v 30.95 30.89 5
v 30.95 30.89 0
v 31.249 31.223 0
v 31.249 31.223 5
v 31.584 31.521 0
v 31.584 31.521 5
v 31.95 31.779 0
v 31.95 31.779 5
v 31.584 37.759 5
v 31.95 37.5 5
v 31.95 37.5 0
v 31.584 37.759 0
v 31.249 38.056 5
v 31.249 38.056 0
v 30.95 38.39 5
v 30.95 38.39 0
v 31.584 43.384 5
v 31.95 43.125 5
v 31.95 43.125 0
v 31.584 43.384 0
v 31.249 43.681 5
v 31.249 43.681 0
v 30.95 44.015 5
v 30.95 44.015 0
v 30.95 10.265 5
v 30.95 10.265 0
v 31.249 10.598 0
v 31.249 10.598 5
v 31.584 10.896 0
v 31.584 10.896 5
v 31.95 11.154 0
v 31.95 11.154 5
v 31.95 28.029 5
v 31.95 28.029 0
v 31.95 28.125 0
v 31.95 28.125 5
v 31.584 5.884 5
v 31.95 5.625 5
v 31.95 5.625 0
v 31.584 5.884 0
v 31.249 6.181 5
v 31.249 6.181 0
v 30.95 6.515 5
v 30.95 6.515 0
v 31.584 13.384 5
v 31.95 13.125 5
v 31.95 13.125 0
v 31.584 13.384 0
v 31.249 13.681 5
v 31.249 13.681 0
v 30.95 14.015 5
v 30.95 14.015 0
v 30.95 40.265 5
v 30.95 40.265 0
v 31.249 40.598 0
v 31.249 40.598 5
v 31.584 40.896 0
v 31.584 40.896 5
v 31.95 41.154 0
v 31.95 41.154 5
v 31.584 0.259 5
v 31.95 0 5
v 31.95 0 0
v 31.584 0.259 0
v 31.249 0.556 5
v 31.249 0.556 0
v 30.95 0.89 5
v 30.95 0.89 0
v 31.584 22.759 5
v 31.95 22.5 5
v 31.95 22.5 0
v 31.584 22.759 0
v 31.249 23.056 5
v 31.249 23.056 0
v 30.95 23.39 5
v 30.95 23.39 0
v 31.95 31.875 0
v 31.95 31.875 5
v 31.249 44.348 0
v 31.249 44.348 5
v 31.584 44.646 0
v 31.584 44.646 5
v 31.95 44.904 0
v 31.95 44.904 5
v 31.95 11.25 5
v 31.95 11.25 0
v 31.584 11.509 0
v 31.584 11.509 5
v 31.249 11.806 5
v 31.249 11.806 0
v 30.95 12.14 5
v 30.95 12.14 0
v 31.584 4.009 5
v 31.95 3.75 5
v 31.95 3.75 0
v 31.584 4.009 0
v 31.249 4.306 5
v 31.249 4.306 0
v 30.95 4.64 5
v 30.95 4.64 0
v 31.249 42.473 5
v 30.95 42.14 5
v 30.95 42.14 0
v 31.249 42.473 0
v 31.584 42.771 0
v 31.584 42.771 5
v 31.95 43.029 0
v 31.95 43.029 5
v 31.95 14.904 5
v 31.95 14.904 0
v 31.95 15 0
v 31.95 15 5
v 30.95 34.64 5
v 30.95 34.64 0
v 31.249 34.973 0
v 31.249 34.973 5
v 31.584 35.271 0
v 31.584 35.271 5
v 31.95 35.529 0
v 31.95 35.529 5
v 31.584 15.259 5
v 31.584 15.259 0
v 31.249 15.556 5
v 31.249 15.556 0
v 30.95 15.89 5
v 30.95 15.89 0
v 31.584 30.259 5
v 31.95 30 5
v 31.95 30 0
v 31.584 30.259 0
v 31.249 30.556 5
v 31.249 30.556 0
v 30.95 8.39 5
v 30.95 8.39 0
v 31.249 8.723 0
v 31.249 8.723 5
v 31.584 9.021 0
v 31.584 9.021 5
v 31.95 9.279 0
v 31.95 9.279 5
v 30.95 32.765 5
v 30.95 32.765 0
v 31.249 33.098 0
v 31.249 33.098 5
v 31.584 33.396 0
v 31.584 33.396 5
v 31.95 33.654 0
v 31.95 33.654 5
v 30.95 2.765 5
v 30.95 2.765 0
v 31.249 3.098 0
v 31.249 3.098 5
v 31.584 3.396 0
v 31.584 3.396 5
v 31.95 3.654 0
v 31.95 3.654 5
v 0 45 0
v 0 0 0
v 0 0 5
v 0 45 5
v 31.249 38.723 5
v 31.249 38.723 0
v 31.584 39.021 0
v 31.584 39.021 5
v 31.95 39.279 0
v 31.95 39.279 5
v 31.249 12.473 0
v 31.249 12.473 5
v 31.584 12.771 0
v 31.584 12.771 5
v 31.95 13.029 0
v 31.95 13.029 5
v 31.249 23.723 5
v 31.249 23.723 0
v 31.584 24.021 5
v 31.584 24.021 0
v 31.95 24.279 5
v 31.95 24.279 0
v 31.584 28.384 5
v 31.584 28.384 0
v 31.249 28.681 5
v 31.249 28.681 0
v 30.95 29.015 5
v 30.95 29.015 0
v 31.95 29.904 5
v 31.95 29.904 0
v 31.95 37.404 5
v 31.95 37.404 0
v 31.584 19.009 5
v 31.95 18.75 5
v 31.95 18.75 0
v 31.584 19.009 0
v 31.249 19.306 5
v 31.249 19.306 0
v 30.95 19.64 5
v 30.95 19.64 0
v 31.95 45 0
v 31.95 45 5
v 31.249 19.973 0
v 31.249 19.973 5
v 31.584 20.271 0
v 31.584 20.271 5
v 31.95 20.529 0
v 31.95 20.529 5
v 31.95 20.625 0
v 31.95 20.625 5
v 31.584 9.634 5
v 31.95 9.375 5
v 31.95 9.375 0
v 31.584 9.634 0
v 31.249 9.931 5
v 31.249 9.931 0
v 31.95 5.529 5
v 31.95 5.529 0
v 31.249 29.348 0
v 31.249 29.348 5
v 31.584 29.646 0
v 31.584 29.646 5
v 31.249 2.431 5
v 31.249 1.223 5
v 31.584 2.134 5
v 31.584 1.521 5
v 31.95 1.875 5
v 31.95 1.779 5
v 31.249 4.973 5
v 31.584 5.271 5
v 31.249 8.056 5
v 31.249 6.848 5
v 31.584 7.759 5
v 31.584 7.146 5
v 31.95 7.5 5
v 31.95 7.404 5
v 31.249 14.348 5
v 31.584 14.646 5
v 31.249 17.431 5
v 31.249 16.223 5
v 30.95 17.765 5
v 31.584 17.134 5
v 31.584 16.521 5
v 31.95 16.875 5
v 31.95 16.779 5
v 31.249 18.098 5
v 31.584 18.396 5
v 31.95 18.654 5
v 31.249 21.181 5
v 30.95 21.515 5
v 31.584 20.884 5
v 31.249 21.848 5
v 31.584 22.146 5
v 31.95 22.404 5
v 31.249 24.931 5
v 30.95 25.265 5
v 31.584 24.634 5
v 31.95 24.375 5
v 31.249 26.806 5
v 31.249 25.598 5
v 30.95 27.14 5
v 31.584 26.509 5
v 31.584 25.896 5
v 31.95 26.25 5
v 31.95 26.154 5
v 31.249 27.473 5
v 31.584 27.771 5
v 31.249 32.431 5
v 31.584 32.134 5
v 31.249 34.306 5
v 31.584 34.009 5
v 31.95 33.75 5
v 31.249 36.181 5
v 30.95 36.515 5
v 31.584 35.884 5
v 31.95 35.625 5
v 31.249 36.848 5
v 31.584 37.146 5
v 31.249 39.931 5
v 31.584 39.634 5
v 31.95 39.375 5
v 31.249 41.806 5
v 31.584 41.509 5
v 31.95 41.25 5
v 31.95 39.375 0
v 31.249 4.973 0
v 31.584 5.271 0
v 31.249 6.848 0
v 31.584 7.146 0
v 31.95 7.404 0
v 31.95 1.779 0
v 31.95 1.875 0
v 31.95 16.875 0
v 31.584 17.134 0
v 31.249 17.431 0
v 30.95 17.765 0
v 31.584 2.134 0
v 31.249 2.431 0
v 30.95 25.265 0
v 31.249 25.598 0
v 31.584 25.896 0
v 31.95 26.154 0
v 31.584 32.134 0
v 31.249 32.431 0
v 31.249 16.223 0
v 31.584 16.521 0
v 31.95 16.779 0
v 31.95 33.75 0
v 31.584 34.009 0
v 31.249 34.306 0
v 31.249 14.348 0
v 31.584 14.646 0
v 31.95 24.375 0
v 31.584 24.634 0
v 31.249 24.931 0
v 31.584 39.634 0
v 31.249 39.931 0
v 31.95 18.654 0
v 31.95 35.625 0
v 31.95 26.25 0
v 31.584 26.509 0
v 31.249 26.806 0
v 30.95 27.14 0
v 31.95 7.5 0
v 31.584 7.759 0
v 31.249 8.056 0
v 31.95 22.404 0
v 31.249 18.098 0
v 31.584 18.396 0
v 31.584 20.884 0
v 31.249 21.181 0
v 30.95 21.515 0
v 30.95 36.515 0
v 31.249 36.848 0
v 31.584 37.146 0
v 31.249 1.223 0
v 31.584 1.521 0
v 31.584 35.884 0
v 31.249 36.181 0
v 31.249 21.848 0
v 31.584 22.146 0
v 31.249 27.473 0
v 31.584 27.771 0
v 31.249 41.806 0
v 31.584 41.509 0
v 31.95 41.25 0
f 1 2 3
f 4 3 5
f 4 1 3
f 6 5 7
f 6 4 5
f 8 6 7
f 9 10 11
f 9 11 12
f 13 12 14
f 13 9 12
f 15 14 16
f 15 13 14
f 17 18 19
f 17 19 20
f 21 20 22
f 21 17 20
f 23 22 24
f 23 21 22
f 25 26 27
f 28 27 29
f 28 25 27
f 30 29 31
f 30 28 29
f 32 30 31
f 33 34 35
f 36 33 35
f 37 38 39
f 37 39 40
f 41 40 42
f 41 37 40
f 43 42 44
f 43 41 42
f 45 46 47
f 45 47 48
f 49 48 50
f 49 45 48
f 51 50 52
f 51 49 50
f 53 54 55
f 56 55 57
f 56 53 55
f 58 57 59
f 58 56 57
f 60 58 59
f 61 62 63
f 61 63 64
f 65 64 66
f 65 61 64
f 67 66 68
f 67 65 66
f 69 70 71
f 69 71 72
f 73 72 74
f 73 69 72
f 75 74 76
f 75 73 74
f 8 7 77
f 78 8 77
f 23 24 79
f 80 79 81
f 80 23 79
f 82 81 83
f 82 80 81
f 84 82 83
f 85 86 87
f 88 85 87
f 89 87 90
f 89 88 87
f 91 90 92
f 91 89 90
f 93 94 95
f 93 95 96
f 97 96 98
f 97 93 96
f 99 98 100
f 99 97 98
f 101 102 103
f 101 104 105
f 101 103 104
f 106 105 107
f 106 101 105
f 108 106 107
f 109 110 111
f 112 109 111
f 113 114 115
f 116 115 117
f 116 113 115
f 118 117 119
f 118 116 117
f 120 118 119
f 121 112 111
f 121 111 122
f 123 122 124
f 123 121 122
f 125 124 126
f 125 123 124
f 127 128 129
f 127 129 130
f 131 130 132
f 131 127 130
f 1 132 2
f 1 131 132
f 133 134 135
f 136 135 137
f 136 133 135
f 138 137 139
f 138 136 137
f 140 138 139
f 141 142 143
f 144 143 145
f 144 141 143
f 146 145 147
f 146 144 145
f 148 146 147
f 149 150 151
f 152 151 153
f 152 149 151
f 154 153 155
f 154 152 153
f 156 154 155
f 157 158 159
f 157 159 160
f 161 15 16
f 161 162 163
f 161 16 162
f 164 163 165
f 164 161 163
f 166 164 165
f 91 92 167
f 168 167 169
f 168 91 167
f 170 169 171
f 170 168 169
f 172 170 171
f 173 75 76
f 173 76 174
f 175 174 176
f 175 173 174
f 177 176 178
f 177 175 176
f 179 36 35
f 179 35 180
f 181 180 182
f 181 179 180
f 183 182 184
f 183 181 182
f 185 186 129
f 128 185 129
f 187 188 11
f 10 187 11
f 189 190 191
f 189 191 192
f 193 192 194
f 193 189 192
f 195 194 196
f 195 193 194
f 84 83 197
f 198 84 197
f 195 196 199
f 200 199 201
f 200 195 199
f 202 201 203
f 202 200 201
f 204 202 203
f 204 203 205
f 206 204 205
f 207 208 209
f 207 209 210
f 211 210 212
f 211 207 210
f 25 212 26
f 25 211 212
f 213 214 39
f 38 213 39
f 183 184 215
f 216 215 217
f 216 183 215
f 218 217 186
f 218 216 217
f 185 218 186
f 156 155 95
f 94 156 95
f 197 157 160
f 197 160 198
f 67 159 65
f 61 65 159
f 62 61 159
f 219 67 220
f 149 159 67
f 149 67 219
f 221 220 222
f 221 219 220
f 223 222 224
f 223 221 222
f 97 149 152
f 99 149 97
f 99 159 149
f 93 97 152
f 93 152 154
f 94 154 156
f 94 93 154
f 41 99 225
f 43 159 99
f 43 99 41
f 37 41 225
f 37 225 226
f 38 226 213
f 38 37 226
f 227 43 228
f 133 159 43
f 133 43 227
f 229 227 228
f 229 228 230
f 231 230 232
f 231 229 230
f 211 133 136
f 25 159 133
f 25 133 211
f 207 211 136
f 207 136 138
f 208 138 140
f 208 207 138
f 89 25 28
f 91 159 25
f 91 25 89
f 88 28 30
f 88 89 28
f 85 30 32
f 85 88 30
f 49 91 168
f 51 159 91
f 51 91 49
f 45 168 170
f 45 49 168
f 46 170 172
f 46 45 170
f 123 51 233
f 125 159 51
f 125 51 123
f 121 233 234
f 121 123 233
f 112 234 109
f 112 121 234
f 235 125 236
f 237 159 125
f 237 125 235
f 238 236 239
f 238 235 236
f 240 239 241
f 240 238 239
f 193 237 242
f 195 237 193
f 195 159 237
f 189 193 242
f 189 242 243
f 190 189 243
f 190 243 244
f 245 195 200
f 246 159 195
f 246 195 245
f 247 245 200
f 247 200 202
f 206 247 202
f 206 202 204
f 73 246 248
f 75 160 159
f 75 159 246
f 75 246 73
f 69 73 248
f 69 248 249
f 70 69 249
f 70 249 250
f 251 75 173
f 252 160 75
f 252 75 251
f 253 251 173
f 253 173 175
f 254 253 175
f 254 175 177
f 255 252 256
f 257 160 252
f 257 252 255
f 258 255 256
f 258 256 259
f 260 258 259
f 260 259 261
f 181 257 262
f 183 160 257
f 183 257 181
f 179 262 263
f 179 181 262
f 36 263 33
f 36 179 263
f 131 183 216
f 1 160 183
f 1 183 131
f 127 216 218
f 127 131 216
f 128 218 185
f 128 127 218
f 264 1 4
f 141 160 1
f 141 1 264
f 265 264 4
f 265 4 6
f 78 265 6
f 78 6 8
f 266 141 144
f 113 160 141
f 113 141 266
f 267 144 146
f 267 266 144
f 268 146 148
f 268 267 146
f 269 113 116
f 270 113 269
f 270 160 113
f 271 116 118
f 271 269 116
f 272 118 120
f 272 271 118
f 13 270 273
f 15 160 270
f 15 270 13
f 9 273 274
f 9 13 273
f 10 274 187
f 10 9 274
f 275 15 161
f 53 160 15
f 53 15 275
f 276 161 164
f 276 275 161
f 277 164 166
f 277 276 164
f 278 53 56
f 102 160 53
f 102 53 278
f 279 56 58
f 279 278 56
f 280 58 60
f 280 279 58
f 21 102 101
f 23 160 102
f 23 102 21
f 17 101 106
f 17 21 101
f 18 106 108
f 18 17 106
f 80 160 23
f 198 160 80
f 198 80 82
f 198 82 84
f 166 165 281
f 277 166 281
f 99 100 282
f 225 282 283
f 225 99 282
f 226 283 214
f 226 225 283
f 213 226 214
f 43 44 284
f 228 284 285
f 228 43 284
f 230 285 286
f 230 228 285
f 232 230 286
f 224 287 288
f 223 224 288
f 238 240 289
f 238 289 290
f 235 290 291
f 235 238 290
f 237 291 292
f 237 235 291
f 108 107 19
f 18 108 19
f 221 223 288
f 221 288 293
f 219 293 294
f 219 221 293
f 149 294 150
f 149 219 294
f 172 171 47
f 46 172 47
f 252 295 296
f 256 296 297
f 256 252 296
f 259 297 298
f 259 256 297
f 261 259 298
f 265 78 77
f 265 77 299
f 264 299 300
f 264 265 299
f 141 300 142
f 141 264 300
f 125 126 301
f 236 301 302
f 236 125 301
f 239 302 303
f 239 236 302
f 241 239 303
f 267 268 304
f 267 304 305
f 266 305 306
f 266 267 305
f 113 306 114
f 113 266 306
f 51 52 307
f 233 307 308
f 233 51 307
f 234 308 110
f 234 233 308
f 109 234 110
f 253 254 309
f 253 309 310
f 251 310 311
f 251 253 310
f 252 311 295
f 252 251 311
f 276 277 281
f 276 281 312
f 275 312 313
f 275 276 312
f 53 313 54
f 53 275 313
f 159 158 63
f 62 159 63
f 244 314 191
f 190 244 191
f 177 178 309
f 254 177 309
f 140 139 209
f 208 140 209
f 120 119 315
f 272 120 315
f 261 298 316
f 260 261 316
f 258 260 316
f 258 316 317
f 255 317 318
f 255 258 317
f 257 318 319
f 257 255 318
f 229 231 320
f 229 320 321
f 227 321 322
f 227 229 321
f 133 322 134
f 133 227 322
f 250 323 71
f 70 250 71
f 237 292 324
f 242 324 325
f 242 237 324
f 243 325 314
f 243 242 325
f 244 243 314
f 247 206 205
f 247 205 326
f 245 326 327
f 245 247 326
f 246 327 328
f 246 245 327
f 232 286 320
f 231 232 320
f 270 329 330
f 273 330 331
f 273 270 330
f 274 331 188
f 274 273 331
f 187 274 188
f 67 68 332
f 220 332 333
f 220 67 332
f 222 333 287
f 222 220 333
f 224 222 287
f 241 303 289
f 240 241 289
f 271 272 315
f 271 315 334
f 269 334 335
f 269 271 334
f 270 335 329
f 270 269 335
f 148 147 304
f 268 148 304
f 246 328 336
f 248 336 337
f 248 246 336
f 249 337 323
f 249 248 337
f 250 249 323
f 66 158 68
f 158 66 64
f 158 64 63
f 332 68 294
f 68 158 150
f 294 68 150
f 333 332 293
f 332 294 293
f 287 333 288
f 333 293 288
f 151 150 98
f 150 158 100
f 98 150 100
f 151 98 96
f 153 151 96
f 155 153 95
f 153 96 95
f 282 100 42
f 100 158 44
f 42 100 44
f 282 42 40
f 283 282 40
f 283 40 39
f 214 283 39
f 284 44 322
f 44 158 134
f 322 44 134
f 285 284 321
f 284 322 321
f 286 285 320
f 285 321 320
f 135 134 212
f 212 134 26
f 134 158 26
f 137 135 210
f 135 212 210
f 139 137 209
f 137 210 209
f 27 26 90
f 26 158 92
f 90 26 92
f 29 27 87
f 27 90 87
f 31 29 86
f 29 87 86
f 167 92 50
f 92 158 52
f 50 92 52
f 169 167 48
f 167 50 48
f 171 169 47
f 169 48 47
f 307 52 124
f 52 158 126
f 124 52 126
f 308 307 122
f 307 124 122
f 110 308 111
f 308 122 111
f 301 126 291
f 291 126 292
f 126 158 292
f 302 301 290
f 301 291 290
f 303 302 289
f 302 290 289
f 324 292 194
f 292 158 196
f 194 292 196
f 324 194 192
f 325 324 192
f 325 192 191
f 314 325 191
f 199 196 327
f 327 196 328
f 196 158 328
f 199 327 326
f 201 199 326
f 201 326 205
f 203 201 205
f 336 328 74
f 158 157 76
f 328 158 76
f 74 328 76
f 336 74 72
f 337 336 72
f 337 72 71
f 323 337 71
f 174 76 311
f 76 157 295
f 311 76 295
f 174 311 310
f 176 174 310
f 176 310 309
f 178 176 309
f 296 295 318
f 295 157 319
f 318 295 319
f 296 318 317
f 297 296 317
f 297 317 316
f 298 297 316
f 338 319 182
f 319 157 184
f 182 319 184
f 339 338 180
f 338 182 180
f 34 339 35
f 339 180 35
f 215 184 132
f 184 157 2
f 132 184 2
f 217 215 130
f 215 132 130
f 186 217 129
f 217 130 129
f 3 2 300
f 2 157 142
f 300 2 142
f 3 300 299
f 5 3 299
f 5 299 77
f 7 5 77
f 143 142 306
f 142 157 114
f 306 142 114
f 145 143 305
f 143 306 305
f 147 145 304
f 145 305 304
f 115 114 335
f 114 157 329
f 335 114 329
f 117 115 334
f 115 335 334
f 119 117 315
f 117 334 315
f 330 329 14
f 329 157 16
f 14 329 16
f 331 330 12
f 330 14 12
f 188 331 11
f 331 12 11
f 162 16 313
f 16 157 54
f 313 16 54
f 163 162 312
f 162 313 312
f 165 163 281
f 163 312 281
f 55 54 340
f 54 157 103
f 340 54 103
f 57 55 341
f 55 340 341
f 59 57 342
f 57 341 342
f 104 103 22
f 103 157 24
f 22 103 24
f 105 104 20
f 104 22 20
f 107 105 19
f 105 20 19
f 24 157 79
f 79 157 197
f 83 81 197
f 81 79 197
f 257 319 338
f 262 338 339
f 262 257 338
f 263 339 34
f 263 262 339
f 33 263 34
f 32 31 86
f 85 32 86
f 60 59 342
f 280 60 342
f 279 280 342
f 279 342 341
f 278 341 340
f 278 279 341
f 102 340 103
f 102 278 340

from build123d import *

# Parameters (mm, degrees)
SKETCH_1_W             = 31.95
SKETCH_1_H             = 45
EXTRUDE_1_DEPTH        = 5
CUT_EXTRUDE_1_DEPTH    = 56.414822024
PATTERN_LINEAR_1_COUNT = 24
PATTERN_LINEAR_1_PITCH = 1.875


with BuildPart() as part:
    # 스케치1 → 보스-돌출1 (new body)
    with BuildSketch(Plane.XY):
        with Locations((15.975, 22.5)):
            Rectangle(SKETCH_1_W, SKETCH_1_H)
    extrude(amount=EXTRUDE_1_DEPTH)

    # 스케치2 → 컷-돌출1 (cut, through all)
    with BuildSketch(Plane.XY.offset(5)):
        with BuildLine():
            Line((34.075880325, 2.389576785), (34.075880325, -0.610423215))
            ThreePointArc((34.075880325, -0.610423215), (32.34230542, -0.216012405), (30.95, 0.889576785))
            ThreePointArc((30.95, 0.889576785), (32.34230542, 1.995165974), (34.075880325, 2.389576785))
        make_face()
    cut_extrude_1 = extrude(amount=-CUT_EXTRUDE_1_DEPTH, mode=Mode.SUBTRACT)

    # 선형 패턴1: 컷-돌출1 ×24
    with Locations(*[(0, i * PATTERN_LINEAR_1_PITCH, 0) for i in range(1, PATTERN_LINEAR_1_COUNT)]):
        add(cut_extrude_1, mode=Mode.SUBTRACT)


solid = part.part
